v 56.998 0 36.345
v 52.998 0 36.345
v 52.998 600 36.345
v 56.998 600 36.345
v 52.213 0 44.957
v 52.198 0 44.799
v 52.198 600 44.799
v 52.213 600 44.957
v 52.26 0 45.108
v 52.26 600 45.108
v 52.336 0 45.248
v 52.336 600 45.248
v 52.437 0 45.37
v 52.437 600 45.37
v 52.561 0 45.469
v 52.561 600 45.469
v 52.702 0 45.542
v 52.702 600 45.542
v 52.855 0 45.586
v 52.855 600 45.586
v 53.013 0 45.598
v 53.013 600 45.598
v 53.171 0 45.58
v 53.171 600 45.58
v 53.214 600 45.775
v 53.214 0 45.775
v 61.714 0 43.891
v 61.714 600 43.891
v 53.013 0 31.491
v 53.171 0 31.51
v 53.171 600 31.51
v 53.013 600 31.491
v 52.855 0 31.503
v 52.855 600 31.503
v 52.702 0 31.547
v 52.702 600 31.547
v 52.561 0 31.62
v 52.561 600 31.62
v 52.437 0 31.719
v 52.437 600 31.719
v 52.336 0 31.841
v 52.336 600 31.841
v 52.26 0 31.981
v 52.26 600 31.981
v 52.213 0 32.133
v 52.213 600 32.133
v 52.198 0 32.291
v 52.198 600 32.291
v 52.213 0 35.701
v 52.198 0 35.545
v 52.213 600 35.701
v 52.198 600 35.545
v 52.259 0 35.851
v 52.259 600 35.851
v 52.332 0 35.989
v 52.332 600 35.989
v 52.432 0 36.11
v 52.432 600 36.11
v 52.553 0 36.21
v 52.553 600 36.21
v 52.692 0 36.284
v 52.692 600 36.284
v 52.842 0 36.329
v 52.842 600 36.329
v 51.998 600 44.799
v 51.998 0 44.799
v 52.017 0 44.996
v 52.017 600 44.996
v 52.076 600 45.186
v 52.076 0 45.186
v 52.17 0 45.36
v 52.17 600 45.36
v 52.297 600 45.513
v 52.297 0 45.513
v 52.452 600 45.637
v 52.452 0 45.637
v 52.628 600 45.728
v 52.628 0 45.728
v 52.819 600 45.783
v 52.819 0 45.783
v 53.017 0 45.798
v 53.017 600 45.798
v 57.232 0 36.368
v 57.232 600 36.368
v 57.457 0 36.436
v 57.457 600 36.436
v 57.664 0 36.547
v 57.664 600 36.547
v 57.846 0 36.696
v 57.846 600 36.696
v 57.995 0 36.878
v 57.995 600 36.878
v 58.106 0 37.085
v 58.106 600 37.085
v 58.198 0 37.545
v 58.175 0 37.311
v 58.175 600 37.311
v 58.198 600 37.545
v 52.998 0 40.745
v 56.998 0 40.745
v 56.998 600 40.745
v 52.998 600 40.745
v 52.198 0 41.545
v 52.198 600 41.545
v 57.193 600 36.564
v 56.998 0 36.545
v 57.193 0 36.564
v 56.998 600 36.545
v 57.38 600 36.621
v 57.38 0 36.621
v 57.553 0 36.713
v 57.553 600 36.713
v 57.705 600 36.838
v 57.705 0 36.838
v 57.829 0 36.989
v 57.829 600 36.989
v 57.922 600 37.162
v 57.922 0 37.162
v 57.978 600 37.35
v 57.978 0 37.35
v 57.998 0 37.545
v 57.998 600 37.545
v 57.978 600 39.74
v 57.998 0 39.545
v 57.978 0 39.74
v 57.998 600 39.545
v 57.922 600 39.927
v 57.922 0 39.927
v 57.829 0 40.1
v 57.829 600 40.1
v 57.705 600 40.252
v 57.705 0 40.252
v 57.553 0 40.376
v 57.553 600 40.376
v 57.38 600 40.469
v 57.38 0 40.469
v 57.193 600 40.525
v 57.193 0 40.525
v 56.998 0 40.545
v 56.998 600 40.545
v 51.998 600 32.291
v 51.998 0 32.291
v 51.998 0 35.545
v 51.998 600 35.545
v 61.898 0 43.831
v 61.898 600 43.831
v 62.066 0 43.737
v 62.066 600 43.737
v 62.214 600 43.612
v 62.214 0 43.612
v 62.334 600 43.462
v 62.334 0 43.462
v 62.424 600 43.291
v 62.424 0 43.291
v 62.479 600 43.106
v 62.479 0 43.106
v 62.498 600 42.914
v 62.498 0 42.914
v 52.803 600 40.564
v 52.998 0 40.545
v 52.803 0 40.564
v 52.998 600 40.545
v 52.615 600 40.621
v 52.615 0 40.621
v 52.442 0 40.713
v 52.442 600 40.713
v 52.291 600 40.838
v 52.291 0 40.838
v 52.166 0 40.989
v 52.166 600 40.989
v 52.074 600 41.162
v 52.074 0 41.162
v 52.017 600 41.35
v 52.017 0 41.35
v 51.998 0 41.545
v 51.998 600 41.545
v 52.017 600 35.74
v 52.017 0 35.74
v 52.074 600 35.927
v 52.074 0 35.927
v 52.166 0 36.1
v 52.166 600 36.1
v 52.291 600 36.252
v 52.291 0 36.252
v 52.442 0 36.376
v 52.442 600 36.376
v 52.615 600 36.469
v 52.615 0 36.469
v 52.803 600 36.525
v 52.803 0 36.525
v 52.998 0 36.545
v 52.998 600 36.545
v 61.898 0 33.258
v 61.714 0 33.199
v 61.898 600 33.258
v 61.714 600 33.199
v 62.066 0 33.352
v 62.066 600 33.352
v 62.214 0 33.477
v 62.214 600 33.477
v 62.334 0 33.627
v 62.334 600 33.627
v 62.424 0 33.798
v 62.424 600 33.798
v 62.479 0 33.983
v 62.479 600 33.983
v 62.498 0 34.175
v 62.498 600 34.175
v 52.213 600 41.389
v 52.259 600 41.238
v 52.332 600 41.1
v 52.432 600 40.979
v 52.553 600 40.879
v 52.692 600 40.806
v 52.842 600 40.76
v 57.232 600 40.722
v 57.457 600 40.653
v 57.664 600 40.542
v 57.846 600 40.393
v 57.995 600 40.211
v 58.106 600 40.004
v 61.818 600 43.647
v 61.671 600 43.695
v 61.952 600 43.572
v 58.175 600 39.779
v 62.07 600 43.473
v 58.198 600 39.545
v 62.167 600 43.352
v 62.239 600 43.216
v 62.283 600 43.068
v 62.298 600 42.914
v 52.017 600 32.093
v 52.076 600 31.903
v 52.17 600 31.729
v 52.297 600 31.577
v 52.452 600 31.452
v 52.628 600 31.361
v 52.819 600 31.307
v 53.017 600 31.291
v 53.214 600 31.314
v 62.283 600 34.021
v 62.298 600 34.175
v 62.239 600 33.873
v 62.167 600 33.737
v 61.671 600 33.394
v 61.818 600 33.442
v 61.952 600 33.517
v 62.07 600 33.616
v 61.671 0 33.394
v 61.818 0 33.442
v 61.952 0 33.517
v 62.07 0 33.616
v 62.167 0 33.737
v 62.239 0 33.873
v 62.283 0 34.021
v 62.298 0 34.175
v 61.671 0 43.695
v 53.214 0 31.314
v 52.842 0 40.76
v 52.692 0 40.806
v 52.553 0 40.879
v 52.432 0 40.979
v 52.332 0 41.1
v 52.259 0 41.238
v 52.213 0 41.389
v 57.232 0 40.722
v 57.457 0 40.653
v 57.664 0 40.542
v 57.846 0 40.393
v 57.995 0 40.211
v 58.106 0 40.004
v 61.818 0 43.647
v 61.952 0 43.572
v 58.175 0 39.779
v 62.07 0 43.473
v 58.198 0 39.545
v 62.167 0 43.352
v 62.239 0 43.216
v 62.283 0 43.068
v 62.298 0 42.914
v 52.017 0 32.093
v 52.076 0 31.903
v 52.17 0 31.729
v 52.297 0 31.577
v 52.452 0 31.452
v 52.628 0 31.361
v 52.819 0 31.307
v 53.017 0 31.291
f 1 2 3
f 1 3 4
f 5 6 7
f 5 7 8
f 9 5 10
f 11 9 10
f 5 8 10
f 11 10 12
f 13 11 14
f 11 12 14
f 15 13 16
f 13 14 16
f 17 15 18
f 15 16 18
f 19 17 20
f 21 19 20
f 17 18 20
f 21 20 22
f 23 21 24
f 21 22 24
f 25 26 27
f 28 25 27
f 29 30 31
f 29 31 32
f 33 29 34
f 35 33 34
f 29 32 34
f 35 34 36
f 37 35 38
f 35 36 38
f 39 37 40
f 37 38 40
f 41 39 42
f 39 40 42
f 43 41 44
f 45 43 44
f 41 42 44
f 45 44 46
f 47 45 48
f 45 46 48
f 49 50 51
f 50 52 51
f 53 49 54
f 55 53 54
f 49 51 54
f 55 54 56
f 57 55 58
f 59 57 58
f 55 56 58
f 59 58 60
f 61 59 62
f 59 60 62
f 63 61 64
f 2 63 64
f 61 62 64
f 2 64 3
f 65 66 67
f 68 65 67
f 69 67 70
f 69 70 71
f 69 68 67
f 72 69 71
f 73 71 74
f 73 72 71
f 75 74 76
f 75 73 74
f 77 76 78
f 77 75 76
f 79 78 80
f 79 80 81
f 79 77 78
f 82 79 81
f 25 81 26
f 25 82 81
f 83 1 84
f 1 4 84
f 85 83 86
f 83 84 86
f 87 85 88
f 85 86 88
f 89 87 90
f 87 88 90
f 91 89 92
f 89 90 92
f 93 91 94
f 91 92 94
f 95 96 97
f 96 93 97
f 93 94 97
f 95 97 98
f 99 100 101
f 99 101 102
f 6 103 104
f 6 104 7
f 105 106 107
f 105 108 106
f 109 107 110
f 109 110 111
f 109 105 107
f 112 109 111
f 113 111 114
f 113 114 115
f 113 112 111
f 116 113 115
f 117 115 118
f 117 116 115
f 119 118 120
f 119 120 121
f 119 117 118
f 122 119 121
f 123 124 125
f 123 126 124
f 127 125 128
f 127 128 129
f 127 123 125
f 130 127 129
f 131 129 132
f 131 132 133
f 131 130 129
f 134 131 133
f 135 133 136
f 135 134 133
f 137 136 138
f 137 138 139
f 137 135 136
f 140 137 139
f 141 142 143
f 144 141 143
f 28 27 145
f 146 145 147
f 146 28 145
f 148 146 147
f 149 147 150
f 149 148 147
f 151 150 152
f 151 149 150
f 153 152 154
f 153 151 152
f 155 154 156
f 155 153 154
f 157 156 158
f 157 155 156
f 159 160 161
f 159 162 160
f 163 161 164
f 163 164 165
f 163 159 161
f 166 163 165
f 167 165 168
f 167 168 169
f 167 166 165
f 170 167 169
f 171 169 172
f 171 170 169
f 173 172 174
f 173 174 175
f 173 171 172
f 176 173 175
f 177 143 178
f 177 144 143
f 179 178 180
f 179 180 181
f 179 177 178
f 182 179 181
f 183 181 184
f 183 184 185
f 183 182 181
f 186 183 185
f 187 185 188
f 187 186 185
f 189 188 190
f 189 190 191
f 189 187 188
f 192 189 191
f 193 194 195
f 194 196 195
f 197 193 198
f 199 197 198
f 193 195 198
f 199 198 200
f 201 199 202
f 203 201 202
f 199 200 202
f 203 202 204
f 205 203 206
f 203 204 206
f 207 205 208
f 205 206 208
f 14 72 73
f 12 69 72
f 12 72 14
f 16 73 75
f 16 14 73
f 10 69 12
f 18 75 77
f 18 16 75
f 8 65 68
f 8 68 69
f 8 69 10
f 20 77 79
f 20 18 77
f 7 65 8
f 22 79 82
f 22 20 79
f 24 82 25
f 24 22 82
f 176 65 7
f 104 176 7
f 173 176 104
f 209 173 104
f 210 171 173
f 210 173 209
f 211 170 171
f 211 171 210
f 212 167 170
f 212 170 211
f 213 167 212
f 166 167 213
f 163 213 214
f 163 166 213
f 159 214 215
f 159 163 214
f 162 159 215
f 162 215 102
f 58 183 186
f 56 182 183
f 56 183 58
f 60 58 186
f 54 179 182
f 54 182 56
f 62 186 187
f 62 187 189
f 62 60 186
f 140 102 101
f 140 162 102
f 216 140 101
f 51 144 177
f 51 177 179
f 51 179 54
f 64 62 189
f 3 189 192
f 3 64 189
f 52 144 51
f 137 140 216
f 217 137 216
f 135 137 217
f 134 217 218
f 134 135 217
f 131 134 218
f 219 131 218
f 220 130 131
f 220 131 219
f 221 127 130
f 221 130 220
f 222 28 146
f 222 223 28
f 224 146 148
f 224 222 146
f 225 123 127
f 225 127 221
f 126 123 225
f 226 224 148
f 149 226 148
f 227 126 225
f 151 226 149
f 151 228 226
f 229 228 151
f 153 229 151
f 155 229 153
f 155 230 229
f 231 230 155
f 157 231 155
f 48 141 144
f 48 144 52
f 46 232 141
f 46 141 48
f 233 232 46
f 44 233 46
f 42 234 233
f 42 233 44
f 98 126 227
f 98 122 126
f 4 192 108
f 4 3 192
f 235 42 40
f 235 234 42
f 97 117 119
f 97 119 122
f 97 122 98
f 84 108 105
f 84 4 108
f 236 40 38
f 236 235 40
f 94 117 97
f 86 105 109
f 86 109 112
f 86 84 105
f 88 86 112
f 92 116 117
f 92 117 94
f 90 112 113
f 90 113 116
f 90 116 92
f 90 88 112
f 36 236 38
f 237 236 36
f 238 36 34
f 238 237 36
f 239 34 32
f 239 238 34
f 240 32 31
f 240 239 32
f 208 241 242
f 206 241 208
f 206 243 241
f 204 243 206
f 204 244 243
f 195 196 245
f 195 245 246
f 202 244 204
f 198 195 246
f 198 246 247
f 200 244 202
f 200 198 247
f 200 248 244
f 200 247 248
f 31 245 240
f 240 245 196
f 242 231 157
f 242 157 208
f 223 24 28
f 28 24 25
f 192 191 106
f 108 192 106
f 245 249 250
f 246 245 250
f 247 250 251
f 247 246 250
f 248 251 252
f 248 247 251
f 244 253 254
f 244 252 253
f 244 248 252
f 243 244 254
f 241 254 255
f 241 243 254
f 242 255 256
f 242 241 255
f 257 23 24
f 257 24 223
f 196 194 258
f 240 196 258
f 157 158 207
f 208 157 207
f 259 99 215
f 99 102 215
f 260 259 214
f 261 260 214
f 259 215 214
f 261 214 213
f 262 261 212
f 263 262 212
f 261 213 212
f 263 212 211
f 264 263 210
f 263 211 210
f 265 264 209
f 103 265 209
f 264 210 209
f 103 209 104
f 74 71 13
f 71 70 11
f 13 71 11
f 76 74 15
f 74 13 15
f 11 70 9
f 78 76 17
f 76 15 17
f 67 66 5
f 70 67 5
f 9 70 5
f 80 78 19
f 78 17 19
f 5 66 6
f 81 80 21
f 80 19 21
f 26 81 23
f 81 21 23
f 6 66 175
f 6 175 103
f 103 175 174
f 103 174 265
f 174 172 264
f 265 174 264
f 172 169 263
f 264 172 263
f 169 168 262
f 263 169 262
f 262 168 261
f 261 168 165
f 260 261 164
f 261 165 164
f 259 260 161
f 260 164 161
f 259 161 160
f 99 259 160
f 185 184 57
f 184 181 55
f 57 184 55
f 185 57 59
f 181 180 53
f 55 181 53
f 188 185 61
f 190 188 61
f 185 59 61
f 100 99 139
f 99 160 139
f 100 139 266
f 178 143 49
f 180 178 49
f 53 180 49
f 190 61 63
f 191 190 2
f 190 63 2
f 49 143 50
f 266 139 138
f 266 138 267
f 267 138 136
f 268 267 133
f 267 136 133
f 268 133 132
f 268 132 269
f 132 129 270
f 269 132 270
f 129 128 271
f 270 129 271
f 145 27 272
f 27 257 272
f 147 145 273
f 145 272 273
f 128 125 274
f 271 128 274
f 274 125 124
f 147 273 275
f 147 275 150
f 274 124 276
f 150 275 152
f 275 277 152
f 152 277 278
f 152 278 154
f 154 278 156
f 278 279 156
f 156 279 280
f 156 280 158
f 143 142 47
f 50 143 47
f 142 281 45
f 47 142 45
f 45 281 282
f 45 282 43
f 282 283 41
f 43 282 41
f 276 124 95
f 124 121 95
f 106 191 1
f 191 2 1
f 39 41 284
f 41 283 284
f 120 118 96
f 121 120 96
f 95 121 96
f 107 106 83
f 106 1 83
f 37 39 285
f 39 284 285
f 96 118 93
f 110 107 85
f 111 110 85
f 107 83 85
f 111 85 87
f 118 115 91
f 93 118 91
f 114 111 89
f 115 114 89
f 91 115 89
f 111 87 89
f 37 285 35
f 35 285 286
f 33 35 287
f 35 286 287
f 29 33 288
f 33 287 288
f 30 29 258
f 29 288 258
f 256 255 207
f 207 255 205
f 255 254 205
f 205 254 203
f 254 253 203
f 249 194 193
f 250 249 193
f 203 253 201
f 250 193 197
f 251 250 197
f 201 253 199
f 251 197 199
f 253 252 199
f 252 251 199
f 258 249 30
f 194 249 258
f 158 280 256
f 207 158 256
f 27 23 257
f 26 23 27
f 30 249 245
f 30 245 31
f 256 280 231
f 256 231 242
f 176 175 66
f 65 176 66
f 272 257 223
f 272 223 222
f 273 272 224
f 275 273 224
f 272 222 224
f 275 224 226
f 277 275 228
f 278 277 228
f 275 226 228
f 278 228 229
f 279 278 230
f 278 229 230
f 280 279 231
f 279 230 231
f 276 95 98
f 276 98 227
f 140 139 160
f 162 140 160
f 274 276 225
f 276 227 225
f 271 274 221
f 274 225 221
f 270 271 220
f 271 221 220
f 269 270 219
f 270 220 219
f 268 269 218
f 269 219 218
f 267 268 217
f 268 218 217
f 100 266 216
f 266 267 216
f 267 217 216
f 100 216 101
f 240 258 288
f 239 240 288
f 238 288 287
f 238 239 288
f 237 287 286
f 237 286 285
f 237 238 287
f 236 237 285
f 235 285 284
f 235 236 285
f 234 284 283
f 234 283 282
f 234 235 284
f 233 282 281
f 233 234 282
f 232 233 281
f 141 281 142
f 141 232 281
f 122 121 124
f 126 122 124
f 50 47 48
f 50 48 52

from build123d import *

# Parameters (mm, degrees)
BOSS_EXTRUDE1_DEPTH = 600
FILLET1_R           = 1
SHELL3_T            = -0.2


with BuildPart() as part:
    # Sketch1 → Boss-Extrude1 (new body)
    with BuildSketch(Plane(origin=(0, 0, 0), x_dir=(1, 0, 0), z_dir=(0, 1, 0))):
        Polygon((62.497660956, -33.372417048), (51.997660956, -31.04462309), (51.997660956, -36.54462309), (57.997660956, -36.54462309), (57.997660956, -40.54462309), (51.997660956, -40.54462309), (51.997660956, -46.04462309), (62.497660956, -43.716829132), align=None)
    extrude(amount=BOSS_EXTRUDE1_DEPTH)

    # Fillet1
    fillet1_edges = [part.edges().sort_by_distance(p)[0] for p in [
        (62.497660956, 300, 43.716829132),
        (51.997660956, 300, 46.04462309),
        (51.997660956, 300, 40.54462309),
        (57.997660956, 300, 40.54462309),
        (57.997660956, 300, 36.54462309),
        (51.997660956, 300, 36.54462309),
        (51.997660956, 300, 31.04462309),
        (62.497660956, 300, 33.372417048),
    ]]
    fillet(fillet1_edges, radius=FILLET1_R)

    # Shell3
    shell3_openings = [part.faces().sort_by_distance(p)[0] for p in [
        (57.425338322, 600, 32.431348777),
        (57.425338322, 0, 32.431348777),
    ]]
    offset(amount=SHELL3_T, openings=shell3_openings, kind=Kind.INTERSECTION)


solid = part.part
